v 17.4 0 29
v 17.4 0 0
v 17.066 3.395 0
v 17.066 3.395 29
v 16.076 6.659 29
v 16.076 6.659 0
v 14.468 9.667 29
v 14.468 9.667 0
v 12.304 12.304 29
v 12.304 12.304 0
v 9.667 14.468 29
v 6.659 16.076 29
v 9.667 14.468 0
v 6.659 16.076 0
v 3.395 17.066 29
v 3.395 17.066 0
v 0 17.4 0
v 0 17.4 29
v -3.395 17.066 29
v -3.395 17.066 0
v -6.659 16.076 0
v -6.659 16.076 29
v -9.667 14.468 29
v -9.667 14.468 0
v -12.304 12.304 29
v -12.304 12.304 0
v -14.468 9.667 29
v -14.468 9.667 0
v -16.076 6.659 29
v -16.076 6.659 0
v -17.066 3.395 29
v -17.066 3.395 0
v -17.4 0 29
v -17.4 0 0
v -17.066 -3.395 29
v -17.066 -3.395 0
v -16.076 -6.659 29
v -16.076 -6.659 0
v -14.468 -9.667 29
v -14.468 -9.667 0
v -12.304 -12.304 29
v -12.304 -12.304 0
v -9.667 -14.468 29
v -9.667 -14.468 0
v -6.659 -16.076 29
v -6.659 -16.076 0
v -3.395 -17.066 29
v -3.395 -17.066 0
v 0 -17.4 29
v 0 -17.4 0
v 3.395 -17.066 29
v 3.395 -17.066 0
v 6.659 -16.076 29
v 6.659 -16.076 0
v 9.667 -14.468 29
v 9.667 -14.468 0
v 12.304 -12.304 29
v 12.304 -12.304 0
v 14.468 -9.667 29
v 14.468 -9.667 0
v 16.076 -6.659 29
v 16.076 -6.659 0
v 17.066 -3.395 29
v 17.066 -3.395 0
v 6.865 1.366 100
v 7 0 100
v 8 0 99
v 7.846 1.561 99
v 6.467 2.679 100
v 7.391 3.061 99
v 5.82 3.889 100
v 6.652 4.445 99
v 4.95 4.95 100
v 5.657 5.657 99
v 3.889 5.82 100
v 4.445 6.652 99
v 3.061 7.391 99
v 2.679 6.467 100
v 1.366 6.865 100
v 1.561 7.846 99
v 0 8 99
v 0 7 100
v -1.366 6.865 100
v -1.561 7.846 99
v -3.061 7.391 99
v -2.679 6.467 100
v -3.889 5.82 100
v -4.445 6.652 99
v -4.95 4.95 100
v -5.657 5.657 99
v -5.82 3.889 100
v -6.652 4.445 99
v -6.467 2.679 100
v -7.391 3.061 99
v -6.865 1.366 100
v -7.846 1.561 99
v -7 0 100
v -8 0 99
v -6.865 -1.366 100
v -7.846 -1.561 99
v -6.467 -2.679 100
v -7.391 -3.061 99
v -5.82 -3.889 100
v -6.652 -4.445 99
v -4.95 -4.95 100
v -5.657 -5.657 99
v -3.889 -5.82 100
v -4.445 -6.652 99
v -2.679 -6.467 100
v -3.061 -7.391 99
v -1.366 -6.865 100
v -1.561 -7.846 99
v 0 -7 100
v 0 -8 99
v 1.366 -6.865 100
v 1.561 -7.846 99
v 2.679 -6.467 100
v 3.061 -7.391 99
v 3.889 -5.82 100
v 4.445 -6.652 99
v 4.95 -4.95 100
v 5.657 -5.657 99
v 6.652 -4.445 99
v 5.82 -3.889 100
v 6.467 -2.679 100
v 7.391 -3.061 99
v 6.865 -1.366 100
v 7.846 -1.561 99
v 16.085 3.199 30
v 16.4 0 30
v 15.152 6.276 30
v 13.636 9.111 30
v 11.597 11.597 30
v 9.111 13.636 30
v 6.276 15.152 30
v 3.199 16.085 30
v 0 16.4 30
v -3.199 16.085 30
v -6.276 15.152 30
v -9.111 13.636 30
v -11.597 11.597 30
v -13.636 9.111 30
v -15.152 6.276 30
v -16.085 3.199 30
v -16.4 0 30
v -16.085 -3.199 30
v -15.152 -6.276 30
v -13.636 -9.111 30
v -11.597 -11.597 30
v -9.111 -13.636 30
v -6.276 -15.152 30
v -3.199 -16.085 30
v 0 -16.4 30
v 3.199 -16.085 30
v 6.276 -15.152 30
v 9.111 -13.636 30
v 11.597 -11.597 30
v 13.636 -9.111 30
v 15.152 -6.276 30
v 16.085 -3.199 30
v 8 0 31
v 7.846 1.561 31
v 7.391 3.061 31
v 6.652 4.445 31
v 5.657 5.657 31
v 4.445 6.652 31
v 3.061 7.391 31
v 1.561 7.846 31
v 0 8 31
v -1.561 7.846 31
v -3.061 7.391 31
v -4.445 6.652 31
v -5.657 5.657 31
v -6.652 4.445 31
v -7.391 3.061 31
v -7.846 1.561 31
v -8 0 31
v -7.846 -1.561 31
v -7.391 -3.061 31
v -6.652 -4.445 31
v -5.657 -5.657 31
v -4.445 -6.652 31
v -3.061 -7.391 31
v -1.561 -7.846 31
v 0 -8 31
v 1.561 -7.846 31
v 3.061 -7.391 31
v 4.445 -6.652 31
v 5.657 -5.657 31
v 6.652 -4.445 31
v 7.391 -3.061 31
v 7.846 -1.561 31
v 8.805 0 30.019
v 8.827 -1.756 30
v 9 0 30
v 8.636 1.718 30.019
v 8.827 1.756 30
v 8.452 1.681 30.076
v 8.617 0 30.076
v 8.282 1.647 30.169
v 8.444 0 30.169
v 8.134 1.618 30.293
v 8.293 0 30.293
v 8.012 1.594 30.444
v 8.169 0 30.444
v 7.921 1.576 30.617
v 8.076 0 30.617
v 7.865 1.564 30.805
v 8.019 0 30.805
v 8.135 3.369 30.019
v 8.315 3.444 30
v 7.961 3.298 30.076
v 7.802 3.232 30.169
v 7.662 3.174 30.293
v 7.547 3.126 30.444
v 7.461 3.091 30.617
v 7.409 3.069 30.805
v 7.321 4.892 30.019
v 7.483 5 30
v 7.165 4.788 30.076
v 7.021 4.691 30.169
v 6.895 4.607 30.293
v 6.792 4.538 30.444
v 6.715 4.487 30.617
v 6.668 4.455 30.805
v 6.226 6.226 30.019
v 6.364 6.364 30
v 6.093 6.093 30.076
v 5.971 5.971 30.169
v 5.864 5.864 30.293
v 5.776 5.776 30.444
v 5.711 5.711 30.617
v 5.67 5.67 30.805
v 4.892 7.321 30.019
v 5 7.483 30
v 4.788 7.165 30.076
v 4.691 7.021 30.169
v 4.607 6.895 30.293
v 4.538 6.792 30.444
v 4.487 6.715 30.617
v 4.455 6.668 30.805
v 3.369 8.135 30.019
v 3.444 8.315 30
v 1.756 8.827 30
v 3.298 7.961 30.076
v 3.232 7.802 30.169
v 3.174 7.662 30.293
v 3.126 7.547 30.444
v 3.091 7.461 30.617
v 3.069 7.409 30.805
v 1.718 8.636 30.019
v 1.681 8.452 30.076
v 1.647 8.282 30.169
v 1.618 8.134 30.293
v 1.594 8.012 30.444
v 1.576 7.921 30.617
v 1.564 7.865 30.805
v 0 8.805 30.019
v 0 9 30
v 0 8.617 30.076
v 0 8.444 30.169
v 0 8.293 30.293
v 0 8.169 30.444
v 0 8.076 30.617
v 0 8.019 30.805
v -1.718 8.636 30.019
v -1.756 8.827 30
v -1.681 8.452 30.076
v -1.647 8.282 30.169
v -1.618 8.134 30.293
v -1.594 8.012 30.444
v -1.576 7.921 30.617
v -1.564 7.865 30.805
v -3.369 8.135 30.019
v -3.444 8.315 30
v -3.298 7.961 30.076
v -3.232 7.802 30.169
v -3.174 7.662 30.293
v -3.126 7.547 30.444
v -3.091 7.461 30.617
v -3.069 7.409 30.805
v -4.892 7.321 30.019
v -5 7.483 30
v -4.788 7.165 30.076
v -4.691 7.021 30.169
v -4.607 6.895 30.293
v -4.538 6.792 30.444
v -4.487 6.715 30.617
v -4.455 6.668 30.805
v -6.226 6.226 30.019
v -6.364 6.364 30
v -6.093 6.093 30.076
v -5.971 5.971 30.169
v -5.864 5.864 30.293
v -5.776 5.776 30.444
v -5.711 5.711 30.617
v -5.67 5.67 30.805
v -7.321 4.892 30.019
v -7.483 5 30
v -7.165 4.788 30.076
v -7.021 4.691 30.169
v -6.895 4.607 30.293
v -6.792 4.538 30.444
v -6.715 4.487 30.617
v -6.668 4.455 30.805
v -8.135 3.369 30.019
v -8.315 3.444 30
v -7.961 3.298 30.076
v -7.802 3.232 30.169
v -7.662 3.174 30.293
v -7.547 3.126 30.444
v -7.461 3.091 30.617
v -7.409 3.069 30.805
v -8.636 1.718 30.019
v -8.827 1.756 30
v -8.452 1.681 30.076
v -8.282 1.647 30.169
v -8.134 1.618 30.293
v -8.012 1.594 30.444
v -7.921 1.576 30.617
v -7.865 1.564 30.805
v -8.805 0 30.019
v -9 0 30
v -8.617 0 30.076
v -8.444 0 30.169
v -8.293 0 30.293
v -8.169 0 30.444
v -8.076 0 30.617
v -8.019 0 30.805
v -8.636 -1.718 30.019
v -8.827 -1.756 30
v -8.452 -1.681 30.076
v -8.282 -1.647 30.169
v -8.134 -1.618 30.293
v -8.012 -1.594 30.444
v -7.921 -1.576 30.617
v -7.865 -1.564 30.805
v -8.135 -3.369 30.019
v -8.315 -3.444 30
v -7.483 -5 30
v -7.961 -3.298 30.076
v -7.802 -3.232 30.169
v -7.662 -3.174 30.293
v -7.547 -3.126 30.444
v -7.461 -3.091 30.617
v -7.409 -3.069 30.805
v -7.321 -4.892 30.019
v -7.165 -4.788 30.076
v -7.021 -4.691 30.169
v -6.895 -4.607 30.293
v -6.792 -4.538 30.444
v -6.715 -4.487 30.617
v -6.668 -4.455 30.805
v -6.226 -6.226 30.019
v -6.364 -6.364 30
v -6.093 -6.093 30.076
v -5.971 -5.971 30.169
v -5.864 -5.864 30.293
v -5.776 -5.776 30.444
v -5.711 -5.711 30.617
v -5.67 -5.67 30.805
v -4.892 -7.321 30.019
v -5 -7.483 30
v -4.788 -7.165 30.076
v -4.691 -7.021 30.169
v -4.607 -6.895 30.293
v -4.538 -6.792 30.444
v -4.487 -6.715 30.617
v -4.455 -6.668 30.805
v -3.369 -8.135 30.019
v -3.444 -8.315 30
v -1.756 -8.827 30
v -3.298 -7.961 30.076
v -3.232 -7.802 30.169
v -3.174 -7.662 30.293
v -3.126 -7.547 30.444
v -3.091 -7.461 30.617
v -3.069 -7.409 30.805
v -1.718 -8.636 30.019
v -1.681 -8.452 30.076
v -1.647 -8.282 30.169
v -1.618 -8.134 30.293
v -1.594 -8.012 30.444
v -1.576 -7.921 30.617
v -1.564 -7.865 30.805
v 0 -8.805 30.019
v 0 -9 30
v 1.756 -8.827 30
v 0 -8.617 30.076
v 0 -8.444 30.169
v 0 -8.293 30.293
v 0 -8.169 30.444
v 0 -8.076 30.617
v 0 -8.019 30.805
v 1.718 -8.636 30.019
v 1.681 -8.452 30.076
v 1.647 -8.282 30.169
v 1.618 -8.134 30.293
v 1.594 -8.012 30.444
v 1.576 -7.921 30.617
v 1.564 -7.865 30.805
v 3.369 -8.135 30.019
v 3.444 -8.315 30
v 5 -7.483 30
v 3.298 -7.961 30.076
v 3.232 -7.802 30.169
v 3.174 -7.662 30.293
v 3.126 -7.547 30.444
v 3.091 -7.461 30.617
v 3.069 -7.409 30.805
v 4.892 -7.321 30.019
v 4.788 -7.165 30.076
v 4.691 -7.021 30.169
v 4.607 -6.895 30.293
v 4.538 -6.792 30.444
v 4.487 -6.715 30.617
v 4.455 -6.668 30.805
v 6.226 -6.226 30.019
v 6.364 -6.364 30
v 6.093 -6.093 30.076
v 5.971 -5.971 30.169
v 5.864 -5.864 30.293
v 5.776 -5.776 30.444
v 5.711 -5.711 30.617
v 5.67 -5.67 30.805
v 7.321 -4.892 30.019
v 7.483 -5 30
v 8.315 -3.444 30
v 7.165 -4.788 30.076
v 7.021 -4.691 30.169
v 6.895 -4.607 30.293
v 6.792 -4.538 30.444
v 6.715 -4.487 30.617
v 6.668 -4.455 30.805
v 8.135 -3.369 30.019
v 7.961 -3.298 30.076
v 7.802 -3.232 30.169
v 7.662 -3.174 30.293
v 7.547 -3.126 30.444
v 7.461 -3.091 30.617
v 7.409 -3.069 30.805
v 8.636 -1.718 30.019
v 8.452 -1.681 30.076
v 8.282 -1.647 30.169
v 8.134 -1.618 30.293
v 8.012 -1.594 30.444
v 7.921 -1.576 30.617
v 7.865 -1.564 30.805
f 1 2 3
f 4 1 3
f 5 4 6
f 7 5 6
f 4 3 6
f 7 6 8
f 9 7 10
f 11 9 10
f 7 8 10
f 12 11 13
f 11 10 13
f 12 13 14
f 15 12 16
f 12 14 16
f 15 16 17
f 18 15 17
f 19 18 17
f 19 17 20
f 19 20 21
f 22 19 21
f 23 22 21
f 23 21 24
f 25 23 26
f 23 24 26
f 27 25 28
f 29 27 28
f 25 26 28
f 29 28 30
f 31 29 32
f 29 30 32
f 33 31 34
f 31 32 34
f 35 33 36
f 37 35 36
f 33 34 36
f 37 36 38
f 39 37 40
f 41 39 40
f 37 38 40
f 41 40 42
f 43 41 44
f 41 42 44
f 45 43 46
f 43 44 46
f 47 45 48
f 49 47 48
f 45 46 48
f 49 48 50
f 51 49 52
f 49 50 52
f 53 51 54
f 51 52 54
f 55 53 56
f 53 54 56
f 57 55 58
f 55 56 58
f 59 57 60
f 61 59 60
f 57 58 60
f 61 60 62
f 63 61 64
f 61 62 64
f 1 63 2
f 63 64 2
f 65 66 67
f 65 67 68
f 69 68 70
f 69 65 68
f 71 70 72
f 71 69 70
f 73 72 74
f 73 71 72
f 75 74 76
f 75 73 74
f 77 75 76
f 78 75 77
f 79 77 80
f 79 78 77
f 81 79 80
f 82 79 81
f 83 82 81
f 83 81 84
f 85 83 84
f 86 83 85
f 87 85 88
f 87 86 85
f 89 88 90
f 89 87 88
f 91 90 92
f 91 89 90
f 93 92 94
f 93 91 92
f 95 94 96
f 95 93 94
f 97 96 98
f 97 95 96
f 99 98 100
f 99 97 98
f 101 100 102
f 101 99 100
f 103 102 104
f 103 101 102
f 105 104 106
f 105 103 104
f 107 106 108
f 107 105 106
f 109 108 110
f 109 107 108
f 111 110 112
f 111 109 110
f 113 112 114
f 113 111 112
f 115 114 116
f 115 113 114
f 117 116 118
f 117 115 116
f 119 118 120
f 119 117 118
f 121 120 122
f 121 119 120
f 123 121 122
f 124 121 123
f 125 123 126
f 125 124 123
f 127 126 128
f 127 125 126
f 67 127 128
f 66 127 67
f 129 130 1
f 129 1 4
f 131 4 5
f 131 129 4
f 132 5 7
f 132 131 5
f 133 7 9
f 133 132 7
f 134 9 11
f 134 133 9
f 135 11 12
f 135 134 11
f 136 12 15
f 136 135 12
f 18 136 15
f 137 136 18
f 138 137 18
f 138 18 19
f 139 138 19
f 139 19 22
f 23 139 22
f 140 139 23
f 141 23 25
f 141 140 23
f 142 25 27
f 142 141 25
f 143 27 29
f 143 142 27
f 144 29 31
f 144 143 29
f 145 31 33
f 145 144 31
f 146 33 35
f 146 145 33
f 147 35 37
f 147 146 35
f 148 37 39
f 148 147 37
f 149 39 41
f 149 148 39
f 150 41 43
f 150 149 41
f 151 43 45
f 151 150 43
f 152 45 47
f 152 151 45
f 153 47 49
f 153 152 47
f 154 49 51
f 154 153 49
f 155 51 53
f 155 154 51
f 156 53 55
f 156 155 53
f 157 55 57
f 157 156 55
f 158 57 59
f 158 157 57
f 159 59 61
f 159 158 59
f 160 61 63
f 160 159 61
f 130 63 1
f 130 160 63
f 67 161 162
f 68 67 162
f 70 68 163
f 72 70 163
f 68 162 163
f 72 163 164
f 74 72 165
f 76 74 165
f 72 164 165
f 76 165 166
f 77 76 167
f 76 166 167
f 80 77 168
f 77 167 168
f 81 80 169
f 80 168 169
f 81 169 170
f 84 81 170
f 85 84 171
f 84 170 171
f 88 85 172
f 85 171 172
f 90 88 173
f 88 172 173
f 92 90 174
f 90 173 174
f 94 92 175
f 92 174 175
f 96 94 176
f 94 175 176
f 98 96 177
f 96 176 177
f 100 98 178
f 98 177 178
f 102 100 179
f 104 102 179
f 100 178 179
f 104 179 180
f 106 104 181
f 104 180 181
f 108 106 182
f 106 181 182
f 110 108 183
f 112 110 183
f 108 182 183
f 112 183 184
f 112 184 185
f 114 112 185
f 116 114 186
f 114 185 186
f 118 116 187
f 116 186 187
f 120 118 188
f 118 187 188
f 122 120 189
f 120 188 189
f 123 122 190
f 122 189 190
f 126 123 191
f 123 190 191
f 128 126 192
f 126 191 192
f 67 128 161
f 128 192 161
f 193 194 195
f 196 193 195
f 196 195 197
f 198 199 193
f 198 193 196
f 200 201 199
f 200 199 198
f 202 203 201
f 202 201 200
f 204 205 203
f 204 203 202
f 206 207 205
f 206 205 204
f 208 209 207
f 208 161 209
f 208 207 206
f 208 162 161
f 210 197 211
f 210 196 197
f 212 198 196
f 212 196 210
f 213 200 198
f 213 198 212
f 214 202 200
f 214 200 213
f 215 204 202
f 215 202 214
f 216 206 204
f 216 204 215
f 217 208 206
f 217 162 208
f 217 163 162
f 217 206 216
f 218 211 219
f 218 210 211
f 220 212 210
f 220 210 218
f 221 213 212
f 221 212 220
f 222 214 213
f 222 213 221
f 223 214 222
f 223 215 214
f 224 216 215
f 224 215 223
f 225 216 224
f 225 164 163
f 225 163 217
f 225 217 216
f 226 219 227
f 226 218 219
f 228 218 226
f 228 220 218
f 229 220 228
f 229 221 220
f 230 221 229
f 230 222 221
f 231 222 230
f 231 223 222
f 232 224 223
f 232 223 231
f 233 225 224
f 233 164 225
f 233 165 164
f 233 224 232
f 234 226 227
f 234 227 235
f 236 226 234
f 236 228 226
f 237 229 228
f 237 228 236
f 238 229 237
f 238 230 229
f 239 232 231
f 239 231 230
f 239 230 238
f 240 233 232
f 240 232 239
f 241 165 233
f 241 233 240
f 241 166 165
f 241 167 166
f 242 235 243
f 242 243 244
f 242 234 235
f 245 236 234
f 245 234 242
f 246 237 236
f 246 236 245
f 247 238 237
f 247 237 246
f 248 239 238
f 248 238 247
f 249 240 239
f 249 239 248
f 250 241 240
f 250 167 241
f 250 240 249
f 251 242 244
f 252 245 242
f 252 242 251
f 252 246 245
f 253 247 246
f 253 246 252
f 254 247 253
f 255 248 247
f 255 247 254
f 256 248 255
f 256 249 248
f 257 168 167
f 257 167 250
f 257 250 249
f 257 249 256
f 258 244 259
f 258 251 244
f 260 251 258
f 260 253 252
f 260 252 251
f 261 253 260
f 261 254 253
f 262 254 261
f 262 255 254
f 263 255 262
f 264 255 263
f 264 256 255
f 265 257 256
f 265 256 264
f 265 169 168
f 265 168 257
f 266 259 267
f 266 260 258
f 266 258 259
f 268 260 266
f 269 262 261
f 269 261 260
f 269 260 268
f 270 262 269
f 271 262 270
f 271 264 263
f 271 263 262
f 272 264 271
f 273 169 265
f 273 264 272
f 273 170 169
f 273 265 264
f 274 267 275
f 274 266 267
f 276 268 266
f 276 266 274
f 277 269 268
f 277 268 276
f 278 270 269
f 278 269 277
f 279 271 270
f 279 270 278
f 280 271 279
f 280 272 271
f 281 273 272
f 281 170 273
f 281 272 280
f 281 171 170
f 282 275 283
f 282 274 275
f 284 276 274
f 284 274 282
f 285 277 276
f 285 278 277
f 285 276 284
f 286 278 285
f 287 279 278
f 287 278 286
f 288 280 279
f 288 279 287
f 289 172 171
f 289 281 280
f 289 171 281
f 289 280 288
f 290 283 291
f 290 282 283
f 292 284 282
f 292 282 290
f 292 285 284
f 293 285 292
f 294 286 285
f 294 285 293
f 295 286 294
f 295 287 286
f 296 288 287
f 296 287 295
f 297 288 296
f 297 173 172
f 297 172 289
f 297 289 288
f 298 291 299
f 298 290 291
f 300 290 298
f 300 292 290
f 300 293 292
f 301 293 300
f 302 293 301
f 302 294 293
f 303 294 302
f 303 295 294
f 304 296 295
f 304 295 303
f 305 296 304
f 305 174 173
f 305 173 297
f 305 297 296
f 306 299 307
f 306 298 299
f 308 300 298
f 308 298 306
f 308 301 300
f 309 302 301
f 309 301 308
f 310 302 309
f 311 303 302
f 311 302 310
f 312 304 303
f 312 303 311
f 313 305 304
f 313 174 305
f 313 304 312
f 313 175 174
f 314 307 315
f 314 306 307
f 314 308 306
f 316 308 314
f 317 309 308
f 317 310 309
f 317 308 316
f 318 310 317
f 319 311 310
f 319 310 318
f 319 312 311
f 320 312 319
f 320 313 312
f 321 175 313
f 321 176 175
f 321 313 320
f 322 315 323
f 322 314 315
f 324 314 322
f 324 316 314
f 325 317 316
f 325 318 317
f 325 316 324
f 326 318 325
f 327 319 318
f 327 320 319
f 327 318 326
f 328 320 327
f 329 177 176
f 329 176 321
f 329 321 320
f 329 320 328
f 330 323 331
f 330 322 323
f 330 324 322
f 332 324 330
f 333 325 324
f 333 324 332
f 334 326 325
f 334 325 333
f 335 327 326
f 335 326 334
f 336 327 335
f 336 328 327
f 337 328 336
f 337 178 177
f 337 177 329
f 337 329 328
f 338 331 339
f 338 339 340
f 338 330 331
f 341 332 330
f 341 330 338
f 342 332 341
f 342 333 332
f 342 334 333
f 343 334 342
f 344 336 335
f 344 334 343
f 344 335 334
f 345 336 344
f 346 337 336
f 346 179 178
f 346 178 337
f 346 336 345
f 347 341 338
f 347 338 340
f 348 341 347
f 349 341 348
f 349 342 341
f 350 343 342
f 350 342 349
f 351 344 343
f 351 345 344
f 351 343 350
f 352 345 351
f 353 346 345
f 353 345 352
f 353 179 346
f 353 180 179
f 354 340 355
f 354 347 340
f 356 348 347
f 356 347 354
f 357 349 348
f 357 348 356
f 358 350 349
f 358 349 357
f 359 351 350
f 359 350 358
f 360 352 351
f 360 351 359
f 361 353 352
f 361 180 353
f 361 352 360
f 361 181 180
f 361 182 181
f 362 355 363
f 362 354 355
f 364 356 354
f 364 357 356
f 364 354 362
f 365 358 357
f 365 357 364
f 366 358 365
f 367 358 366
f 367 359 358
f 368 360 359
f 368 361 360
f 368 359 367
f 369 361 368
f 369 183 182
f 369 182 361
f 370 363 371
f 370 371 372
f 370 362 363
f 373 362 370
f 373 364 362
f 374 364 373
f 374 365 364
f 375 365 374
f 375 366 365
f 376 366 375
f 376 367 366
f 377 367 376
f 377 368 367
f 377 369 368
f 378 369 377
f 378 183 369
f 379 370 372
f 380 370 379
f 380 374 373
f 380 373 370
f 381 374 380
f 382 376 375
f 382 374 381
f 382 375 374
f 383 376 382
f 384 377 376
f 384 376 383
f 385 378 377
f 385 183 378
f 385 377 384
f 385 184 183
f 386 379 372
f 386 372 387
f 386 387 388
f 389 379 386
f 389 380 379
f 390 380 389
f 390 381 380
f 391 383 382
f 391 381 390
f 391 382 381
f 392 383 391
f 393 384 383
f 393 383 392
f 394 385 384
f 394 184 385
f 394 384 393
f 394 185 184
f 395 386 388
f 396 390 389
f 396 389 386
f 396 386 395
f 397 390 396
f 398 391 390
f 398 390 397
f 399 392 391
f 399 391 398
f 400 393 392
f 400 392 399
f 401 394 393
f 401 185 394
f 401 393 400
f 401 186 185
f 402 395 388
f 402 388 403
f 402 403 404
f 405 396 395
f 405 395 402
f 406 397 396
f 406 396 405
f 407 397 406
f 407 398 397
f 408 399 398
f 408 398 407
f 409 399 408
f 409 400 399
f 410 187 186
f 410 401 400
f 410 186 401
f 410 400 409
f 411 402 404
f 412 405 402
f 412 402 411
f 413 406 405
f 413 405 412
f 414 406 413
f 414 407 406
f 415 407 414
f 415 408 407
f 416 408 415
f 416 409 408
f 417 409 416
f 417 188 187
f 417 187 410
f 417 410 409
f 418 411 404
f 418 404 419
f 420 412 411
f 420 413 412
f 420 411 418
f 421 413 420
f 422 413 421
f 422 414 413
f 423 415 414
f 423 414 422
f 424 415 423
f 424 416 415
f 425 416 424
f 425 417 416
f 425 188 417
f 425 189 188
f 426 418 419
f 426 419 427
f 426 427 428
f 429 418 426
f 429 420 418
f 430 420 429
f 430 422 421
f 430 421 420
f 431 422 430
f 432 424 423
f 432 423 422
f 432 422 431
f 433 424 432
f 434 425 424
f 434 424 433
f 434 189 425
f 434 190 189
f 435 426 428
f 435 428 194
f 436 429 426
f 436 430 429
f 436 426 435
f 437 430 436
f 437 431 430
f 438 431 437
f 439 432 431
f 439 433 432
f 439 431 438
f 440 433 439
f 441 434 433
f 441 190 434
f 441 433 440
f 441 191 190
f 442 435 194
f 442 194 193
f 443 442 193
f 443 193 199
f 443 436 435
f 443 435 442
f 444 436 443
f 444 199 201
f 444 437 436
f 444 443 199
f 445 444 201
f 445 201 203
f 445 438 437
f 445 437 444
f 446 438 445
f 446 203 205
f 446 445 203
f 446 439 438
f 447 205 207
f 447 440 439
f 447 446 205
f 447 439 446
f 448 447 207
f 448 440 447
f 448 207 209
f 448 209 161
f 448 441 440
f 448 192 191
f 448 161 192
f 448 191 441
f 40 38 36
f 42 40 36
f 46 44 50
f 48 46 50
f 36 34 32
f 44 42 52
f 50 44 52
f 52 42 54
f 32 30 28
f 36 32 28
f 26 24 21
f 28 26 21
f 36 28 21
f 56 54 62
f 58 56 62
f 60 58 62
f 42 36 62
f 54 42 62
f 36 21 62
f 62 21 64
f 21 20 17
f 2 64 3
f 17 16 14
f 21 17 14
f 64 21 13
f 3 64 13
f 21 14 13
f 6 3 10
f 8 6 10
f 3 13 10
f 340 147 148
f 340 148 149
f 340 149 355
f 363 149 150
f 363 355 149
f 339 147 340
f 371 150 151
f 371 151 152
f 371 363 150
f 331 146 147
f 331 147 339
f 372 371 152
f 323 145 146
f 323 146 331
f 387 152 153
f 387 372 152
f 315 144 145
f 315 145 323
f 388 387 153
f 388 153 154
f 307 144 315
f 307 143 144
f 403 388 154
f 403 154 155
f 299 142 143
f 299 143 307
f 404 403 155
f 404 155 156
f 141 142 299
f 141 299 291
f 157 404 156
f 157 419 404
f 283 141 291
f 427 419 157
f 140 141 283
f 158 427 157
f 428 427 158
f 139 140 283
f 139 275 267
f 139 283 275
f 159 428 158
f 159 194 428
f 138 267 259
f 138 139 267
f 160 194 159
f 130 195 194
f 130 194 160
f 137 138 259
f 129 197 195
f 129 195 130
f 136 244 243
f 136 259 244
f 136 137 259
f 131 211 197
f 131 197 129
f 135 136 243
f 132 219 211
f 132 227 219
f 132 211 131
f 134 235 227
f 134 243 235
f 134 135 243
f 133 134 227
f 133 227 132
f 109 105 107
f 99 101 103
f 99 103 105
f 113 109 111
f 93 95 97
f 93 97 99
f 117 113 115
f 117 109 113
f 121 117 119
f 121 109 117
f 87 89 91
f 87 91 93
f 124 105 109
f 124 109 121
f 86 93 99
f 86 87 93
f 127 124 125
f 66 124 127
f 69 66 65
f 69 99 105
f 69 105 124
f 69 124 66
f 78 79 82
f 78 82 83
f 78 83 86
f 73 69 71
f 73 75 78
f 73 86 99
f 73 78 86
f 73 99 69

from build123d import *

# Parameters (mm, degrees)
SKETCH1_R     = 17.4
BODY_DEPTH    = 30
SKETCH2_R     = 8
SPIGOT_DEPTH  = 70
CHAMFERS_SIZE = 1
FILLET_2_R    = 1


with BuildPart() as part:
    # Sketch1 → Body (new body)
    with BuildSketch(Plane.XY):
        Circle(SKETCH1_R)
    extrude(amount=BODY_DEPTH)

    # Sketch2 → Spigot (add)
    with BuildSketch(Plane.XY.offset(30)):
        Circle(SKETCH2_R)
    extrude(amount=SPIGOT_DEPTH)

    # Chamfers
    chamfers_edges = [part.edges().sort_by_distance(p)[0] for p in [
        (-17.4, 0, 30),
        (-8, 0, 100),
    ]]
    chamfer(chamfers_edges, length=CHAMFERS_SIZE)

    # Fillet 2
    fillet_2_edges = [part.edges().sort_by_distance(p)[0] for p in [
        (-8, 0, 30),
    ]]
    fillet(fillet_2_edges, radius=FILLET_2_R)


solid = part.part
